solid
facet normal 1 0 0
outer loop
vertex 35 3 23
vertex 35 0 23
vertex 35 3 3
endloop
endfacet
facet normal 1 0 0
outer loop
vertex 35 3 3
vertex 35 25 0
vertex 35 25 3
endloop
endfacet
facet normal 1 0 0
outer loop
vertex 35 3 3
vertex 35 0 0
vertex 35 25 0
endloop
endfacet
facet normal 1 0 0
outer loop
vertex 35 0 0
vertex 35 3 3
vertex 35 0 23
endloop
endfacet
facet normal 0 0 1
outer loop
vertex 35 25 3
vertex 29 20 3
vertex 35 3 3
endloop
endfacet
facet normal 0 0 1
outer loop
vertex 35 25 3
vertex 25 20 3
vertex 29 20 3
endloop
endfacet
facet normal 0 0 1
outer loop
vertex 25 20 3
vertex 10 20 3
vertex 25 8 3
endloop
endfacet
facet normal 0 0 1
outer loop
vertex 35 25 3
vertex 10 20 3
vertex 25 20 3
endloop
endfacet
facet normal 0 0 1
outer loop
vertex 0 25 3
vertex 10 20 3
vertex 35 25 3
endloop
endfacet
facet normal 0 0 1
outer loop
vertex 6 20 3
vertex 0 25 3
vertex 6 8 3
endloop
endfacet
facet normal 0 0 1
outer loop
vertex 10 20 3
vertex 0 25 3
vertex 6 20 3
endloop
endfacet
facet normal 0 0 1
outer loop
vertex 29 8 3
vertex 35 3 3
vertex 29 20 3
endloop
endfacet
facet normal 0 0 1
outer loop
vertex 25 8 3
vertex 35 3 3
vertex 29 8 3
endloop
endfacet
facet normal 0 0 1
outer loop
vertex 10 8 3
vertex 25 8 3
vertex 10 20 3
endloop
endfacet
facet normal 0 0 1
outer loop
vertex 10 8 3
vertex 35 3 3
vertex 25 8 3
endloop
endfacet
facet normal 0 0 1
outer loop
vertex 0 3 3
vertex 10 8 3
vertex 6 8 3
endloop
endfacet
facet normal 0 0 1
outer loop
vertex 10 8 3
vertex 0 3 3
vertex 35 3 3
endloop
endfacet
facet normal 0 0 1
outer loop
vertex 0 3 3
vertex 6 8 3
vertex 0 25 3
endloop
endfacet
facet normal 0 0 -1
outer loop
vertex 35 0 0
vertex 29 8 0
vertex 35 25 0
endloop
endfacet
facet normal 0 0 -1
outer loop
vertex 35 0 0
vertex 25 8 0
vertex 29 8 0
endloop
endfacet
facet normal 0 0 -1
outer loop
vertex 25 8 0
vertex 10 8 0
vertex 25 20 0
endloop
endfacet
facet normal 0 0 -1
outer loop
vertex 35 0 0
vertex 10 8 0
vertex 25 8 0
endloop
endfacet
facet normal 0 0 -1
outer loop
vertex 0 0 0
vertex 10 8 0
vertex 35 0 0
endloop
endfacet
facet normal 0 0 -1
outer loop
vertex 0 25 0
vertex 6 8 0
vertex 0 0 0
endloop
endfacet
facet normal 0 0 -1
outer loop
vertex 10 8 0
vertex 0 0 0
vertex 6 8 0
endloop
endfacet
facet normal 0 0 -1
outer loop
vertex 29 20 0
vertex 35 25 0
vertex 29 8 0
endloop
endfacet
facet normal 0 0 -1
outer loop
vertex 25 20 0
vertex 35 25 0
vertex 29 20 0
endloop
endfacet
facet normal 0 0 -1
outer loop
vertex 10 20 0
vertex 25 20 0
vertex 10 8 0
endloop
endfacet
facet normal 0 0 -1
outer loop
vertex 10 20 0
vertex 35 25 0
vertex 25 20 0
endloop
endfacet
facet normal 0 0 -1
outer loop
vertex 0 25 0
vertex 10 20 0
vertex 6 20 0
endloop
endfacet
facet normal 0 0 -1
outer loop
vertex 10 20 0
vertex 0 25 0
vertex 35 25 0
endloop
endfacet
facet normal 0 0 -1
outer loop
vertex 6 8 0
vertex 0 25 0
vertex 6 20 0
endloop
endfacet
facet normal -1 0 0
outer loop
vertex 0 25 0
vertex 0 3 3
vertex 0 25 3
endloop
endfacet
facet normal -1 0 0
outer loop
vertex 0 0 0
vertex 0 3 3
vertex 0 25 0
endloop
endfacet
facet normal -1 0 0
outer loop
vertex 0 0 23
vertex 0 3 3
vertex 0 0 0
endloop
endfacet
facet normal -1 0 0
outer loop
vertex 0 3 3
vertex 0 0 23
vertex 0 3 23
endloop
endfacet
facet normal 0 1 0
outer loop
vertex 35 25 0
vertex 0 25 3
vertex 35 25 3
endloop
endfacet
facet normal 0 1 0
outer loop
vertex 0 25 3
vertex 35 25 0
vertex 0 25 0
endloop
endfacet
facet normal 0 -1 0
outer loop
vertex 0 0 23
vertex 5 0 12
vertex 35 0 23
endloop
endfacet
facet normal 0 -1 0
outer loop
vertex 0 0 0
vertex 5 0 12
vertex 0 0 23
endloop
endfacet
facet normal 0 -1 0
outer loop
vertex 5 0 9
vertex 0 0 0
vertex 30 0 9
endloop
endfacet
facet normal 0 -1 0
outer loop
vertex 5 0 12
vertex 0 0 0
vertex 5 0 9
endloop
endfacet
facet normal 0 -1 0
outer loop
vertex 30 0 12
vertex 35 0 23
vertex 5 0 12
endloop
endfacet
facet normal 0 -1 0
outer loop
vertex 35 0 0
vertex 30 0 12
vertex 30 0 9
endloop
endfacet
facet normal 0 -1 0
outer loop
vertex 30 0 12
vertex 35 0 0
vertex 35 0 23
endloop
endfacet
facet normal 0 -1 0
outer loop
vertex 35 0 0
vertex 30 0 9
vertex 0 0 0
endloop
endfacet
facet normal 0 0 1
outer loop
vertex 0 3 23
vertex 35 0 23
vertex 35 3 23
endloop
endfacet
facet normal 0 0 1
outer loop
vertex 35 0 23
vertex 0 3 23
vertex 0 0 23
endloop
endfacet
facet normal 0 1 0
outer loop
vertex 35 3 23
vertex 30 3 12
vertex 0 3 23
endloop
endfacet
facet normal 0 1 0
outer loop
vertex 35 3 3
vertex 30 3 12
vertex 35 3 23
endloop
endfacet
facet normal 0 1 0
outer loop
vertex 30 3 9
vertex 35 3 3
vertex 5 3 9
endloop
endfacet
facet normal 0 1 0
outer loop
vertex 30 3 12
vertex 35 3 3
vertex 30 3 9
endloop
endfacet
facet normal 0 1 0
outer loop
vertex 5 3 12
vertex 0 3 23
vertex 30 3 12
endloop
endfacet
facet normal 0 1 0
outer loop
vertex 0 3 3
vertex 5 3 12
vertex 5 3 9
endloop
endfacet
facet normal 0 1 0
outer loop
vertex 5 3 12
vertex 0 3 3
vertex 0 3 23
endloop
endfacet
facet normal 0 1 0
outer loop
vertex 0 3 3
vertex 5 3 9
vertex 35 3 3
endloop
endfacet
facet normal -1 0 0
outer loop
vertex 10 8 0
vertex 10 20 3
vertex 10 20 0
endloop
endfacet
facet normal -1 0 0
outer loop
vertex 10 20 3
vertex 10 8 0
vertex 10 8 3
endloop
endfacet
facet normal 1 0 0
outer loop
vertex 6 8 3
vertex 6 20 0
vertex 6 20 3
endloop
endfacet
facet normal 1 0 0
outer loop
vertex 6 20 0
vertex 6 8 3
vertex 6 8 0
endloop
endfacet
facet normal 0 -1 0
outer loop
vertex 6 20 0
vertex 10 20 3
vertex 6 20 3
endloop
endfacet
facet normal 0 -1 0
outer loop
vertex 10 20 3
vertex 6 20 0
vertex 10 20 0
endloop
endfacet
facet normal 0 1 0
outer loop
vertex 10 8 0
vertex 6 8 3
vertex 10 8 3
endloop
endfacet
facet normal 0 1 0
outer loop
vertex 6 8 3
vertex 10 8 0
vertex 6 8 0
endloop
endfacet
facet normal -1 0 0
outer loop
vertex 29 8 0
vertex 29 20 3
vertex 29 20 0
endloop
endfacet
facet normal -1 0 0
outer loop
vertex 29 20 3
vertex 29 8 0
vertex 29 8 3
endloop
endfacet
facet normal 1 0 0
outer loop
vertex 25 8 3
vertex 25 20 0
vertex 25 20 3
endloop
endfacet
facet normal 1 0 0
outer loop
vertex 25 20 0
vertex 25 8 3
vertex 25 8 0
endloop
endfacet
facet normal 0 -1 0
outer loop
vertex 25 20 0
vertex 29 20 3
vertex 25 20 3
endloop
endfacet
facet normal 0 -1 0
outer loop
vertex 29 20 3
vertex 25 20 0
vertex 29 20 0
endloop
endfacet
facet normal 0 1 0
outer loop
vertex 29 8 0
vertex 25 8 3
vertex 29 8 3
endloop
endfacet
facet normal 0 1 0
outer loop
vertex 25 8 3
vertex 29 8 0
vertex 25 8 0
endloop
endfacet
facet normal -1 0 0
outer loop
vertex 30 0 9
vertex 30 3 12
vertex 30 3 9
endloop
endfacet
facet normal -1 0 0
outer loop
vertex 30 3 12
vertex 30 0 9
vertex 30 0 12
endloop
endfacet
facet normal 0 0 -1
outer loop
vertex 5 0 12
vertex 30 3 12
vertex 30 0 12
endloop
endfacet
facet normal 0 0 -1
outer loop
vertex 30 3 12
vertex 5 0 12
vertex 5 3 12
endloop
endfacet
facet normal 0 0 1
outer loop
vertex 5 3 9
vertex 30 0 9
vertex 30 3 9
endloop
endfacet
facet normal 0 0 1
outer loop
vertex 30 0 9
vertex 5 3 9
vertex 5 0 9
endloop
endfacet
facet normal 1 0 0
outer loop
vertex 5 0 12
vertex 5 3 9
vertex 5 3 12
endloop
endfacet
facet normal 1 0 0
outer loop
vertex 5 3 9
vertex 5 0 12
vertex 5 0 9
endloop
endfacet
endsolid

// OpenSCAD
// TEMPLATE ONLY. Measure and edit before printing. Millimetres.
difference(){union(){
translate([0, 0, 0]) cube([35, 25, 3]);
translate([0, 0, 3]) cube([35, 3, 20]);
}
translate([6, 8, -1]) cube([4, 12, 5]);
translate([25, 8, -1]) cube([4, 12, 5]);
translate([5, -1, 9]) cube([25, 5, 3]);
}
